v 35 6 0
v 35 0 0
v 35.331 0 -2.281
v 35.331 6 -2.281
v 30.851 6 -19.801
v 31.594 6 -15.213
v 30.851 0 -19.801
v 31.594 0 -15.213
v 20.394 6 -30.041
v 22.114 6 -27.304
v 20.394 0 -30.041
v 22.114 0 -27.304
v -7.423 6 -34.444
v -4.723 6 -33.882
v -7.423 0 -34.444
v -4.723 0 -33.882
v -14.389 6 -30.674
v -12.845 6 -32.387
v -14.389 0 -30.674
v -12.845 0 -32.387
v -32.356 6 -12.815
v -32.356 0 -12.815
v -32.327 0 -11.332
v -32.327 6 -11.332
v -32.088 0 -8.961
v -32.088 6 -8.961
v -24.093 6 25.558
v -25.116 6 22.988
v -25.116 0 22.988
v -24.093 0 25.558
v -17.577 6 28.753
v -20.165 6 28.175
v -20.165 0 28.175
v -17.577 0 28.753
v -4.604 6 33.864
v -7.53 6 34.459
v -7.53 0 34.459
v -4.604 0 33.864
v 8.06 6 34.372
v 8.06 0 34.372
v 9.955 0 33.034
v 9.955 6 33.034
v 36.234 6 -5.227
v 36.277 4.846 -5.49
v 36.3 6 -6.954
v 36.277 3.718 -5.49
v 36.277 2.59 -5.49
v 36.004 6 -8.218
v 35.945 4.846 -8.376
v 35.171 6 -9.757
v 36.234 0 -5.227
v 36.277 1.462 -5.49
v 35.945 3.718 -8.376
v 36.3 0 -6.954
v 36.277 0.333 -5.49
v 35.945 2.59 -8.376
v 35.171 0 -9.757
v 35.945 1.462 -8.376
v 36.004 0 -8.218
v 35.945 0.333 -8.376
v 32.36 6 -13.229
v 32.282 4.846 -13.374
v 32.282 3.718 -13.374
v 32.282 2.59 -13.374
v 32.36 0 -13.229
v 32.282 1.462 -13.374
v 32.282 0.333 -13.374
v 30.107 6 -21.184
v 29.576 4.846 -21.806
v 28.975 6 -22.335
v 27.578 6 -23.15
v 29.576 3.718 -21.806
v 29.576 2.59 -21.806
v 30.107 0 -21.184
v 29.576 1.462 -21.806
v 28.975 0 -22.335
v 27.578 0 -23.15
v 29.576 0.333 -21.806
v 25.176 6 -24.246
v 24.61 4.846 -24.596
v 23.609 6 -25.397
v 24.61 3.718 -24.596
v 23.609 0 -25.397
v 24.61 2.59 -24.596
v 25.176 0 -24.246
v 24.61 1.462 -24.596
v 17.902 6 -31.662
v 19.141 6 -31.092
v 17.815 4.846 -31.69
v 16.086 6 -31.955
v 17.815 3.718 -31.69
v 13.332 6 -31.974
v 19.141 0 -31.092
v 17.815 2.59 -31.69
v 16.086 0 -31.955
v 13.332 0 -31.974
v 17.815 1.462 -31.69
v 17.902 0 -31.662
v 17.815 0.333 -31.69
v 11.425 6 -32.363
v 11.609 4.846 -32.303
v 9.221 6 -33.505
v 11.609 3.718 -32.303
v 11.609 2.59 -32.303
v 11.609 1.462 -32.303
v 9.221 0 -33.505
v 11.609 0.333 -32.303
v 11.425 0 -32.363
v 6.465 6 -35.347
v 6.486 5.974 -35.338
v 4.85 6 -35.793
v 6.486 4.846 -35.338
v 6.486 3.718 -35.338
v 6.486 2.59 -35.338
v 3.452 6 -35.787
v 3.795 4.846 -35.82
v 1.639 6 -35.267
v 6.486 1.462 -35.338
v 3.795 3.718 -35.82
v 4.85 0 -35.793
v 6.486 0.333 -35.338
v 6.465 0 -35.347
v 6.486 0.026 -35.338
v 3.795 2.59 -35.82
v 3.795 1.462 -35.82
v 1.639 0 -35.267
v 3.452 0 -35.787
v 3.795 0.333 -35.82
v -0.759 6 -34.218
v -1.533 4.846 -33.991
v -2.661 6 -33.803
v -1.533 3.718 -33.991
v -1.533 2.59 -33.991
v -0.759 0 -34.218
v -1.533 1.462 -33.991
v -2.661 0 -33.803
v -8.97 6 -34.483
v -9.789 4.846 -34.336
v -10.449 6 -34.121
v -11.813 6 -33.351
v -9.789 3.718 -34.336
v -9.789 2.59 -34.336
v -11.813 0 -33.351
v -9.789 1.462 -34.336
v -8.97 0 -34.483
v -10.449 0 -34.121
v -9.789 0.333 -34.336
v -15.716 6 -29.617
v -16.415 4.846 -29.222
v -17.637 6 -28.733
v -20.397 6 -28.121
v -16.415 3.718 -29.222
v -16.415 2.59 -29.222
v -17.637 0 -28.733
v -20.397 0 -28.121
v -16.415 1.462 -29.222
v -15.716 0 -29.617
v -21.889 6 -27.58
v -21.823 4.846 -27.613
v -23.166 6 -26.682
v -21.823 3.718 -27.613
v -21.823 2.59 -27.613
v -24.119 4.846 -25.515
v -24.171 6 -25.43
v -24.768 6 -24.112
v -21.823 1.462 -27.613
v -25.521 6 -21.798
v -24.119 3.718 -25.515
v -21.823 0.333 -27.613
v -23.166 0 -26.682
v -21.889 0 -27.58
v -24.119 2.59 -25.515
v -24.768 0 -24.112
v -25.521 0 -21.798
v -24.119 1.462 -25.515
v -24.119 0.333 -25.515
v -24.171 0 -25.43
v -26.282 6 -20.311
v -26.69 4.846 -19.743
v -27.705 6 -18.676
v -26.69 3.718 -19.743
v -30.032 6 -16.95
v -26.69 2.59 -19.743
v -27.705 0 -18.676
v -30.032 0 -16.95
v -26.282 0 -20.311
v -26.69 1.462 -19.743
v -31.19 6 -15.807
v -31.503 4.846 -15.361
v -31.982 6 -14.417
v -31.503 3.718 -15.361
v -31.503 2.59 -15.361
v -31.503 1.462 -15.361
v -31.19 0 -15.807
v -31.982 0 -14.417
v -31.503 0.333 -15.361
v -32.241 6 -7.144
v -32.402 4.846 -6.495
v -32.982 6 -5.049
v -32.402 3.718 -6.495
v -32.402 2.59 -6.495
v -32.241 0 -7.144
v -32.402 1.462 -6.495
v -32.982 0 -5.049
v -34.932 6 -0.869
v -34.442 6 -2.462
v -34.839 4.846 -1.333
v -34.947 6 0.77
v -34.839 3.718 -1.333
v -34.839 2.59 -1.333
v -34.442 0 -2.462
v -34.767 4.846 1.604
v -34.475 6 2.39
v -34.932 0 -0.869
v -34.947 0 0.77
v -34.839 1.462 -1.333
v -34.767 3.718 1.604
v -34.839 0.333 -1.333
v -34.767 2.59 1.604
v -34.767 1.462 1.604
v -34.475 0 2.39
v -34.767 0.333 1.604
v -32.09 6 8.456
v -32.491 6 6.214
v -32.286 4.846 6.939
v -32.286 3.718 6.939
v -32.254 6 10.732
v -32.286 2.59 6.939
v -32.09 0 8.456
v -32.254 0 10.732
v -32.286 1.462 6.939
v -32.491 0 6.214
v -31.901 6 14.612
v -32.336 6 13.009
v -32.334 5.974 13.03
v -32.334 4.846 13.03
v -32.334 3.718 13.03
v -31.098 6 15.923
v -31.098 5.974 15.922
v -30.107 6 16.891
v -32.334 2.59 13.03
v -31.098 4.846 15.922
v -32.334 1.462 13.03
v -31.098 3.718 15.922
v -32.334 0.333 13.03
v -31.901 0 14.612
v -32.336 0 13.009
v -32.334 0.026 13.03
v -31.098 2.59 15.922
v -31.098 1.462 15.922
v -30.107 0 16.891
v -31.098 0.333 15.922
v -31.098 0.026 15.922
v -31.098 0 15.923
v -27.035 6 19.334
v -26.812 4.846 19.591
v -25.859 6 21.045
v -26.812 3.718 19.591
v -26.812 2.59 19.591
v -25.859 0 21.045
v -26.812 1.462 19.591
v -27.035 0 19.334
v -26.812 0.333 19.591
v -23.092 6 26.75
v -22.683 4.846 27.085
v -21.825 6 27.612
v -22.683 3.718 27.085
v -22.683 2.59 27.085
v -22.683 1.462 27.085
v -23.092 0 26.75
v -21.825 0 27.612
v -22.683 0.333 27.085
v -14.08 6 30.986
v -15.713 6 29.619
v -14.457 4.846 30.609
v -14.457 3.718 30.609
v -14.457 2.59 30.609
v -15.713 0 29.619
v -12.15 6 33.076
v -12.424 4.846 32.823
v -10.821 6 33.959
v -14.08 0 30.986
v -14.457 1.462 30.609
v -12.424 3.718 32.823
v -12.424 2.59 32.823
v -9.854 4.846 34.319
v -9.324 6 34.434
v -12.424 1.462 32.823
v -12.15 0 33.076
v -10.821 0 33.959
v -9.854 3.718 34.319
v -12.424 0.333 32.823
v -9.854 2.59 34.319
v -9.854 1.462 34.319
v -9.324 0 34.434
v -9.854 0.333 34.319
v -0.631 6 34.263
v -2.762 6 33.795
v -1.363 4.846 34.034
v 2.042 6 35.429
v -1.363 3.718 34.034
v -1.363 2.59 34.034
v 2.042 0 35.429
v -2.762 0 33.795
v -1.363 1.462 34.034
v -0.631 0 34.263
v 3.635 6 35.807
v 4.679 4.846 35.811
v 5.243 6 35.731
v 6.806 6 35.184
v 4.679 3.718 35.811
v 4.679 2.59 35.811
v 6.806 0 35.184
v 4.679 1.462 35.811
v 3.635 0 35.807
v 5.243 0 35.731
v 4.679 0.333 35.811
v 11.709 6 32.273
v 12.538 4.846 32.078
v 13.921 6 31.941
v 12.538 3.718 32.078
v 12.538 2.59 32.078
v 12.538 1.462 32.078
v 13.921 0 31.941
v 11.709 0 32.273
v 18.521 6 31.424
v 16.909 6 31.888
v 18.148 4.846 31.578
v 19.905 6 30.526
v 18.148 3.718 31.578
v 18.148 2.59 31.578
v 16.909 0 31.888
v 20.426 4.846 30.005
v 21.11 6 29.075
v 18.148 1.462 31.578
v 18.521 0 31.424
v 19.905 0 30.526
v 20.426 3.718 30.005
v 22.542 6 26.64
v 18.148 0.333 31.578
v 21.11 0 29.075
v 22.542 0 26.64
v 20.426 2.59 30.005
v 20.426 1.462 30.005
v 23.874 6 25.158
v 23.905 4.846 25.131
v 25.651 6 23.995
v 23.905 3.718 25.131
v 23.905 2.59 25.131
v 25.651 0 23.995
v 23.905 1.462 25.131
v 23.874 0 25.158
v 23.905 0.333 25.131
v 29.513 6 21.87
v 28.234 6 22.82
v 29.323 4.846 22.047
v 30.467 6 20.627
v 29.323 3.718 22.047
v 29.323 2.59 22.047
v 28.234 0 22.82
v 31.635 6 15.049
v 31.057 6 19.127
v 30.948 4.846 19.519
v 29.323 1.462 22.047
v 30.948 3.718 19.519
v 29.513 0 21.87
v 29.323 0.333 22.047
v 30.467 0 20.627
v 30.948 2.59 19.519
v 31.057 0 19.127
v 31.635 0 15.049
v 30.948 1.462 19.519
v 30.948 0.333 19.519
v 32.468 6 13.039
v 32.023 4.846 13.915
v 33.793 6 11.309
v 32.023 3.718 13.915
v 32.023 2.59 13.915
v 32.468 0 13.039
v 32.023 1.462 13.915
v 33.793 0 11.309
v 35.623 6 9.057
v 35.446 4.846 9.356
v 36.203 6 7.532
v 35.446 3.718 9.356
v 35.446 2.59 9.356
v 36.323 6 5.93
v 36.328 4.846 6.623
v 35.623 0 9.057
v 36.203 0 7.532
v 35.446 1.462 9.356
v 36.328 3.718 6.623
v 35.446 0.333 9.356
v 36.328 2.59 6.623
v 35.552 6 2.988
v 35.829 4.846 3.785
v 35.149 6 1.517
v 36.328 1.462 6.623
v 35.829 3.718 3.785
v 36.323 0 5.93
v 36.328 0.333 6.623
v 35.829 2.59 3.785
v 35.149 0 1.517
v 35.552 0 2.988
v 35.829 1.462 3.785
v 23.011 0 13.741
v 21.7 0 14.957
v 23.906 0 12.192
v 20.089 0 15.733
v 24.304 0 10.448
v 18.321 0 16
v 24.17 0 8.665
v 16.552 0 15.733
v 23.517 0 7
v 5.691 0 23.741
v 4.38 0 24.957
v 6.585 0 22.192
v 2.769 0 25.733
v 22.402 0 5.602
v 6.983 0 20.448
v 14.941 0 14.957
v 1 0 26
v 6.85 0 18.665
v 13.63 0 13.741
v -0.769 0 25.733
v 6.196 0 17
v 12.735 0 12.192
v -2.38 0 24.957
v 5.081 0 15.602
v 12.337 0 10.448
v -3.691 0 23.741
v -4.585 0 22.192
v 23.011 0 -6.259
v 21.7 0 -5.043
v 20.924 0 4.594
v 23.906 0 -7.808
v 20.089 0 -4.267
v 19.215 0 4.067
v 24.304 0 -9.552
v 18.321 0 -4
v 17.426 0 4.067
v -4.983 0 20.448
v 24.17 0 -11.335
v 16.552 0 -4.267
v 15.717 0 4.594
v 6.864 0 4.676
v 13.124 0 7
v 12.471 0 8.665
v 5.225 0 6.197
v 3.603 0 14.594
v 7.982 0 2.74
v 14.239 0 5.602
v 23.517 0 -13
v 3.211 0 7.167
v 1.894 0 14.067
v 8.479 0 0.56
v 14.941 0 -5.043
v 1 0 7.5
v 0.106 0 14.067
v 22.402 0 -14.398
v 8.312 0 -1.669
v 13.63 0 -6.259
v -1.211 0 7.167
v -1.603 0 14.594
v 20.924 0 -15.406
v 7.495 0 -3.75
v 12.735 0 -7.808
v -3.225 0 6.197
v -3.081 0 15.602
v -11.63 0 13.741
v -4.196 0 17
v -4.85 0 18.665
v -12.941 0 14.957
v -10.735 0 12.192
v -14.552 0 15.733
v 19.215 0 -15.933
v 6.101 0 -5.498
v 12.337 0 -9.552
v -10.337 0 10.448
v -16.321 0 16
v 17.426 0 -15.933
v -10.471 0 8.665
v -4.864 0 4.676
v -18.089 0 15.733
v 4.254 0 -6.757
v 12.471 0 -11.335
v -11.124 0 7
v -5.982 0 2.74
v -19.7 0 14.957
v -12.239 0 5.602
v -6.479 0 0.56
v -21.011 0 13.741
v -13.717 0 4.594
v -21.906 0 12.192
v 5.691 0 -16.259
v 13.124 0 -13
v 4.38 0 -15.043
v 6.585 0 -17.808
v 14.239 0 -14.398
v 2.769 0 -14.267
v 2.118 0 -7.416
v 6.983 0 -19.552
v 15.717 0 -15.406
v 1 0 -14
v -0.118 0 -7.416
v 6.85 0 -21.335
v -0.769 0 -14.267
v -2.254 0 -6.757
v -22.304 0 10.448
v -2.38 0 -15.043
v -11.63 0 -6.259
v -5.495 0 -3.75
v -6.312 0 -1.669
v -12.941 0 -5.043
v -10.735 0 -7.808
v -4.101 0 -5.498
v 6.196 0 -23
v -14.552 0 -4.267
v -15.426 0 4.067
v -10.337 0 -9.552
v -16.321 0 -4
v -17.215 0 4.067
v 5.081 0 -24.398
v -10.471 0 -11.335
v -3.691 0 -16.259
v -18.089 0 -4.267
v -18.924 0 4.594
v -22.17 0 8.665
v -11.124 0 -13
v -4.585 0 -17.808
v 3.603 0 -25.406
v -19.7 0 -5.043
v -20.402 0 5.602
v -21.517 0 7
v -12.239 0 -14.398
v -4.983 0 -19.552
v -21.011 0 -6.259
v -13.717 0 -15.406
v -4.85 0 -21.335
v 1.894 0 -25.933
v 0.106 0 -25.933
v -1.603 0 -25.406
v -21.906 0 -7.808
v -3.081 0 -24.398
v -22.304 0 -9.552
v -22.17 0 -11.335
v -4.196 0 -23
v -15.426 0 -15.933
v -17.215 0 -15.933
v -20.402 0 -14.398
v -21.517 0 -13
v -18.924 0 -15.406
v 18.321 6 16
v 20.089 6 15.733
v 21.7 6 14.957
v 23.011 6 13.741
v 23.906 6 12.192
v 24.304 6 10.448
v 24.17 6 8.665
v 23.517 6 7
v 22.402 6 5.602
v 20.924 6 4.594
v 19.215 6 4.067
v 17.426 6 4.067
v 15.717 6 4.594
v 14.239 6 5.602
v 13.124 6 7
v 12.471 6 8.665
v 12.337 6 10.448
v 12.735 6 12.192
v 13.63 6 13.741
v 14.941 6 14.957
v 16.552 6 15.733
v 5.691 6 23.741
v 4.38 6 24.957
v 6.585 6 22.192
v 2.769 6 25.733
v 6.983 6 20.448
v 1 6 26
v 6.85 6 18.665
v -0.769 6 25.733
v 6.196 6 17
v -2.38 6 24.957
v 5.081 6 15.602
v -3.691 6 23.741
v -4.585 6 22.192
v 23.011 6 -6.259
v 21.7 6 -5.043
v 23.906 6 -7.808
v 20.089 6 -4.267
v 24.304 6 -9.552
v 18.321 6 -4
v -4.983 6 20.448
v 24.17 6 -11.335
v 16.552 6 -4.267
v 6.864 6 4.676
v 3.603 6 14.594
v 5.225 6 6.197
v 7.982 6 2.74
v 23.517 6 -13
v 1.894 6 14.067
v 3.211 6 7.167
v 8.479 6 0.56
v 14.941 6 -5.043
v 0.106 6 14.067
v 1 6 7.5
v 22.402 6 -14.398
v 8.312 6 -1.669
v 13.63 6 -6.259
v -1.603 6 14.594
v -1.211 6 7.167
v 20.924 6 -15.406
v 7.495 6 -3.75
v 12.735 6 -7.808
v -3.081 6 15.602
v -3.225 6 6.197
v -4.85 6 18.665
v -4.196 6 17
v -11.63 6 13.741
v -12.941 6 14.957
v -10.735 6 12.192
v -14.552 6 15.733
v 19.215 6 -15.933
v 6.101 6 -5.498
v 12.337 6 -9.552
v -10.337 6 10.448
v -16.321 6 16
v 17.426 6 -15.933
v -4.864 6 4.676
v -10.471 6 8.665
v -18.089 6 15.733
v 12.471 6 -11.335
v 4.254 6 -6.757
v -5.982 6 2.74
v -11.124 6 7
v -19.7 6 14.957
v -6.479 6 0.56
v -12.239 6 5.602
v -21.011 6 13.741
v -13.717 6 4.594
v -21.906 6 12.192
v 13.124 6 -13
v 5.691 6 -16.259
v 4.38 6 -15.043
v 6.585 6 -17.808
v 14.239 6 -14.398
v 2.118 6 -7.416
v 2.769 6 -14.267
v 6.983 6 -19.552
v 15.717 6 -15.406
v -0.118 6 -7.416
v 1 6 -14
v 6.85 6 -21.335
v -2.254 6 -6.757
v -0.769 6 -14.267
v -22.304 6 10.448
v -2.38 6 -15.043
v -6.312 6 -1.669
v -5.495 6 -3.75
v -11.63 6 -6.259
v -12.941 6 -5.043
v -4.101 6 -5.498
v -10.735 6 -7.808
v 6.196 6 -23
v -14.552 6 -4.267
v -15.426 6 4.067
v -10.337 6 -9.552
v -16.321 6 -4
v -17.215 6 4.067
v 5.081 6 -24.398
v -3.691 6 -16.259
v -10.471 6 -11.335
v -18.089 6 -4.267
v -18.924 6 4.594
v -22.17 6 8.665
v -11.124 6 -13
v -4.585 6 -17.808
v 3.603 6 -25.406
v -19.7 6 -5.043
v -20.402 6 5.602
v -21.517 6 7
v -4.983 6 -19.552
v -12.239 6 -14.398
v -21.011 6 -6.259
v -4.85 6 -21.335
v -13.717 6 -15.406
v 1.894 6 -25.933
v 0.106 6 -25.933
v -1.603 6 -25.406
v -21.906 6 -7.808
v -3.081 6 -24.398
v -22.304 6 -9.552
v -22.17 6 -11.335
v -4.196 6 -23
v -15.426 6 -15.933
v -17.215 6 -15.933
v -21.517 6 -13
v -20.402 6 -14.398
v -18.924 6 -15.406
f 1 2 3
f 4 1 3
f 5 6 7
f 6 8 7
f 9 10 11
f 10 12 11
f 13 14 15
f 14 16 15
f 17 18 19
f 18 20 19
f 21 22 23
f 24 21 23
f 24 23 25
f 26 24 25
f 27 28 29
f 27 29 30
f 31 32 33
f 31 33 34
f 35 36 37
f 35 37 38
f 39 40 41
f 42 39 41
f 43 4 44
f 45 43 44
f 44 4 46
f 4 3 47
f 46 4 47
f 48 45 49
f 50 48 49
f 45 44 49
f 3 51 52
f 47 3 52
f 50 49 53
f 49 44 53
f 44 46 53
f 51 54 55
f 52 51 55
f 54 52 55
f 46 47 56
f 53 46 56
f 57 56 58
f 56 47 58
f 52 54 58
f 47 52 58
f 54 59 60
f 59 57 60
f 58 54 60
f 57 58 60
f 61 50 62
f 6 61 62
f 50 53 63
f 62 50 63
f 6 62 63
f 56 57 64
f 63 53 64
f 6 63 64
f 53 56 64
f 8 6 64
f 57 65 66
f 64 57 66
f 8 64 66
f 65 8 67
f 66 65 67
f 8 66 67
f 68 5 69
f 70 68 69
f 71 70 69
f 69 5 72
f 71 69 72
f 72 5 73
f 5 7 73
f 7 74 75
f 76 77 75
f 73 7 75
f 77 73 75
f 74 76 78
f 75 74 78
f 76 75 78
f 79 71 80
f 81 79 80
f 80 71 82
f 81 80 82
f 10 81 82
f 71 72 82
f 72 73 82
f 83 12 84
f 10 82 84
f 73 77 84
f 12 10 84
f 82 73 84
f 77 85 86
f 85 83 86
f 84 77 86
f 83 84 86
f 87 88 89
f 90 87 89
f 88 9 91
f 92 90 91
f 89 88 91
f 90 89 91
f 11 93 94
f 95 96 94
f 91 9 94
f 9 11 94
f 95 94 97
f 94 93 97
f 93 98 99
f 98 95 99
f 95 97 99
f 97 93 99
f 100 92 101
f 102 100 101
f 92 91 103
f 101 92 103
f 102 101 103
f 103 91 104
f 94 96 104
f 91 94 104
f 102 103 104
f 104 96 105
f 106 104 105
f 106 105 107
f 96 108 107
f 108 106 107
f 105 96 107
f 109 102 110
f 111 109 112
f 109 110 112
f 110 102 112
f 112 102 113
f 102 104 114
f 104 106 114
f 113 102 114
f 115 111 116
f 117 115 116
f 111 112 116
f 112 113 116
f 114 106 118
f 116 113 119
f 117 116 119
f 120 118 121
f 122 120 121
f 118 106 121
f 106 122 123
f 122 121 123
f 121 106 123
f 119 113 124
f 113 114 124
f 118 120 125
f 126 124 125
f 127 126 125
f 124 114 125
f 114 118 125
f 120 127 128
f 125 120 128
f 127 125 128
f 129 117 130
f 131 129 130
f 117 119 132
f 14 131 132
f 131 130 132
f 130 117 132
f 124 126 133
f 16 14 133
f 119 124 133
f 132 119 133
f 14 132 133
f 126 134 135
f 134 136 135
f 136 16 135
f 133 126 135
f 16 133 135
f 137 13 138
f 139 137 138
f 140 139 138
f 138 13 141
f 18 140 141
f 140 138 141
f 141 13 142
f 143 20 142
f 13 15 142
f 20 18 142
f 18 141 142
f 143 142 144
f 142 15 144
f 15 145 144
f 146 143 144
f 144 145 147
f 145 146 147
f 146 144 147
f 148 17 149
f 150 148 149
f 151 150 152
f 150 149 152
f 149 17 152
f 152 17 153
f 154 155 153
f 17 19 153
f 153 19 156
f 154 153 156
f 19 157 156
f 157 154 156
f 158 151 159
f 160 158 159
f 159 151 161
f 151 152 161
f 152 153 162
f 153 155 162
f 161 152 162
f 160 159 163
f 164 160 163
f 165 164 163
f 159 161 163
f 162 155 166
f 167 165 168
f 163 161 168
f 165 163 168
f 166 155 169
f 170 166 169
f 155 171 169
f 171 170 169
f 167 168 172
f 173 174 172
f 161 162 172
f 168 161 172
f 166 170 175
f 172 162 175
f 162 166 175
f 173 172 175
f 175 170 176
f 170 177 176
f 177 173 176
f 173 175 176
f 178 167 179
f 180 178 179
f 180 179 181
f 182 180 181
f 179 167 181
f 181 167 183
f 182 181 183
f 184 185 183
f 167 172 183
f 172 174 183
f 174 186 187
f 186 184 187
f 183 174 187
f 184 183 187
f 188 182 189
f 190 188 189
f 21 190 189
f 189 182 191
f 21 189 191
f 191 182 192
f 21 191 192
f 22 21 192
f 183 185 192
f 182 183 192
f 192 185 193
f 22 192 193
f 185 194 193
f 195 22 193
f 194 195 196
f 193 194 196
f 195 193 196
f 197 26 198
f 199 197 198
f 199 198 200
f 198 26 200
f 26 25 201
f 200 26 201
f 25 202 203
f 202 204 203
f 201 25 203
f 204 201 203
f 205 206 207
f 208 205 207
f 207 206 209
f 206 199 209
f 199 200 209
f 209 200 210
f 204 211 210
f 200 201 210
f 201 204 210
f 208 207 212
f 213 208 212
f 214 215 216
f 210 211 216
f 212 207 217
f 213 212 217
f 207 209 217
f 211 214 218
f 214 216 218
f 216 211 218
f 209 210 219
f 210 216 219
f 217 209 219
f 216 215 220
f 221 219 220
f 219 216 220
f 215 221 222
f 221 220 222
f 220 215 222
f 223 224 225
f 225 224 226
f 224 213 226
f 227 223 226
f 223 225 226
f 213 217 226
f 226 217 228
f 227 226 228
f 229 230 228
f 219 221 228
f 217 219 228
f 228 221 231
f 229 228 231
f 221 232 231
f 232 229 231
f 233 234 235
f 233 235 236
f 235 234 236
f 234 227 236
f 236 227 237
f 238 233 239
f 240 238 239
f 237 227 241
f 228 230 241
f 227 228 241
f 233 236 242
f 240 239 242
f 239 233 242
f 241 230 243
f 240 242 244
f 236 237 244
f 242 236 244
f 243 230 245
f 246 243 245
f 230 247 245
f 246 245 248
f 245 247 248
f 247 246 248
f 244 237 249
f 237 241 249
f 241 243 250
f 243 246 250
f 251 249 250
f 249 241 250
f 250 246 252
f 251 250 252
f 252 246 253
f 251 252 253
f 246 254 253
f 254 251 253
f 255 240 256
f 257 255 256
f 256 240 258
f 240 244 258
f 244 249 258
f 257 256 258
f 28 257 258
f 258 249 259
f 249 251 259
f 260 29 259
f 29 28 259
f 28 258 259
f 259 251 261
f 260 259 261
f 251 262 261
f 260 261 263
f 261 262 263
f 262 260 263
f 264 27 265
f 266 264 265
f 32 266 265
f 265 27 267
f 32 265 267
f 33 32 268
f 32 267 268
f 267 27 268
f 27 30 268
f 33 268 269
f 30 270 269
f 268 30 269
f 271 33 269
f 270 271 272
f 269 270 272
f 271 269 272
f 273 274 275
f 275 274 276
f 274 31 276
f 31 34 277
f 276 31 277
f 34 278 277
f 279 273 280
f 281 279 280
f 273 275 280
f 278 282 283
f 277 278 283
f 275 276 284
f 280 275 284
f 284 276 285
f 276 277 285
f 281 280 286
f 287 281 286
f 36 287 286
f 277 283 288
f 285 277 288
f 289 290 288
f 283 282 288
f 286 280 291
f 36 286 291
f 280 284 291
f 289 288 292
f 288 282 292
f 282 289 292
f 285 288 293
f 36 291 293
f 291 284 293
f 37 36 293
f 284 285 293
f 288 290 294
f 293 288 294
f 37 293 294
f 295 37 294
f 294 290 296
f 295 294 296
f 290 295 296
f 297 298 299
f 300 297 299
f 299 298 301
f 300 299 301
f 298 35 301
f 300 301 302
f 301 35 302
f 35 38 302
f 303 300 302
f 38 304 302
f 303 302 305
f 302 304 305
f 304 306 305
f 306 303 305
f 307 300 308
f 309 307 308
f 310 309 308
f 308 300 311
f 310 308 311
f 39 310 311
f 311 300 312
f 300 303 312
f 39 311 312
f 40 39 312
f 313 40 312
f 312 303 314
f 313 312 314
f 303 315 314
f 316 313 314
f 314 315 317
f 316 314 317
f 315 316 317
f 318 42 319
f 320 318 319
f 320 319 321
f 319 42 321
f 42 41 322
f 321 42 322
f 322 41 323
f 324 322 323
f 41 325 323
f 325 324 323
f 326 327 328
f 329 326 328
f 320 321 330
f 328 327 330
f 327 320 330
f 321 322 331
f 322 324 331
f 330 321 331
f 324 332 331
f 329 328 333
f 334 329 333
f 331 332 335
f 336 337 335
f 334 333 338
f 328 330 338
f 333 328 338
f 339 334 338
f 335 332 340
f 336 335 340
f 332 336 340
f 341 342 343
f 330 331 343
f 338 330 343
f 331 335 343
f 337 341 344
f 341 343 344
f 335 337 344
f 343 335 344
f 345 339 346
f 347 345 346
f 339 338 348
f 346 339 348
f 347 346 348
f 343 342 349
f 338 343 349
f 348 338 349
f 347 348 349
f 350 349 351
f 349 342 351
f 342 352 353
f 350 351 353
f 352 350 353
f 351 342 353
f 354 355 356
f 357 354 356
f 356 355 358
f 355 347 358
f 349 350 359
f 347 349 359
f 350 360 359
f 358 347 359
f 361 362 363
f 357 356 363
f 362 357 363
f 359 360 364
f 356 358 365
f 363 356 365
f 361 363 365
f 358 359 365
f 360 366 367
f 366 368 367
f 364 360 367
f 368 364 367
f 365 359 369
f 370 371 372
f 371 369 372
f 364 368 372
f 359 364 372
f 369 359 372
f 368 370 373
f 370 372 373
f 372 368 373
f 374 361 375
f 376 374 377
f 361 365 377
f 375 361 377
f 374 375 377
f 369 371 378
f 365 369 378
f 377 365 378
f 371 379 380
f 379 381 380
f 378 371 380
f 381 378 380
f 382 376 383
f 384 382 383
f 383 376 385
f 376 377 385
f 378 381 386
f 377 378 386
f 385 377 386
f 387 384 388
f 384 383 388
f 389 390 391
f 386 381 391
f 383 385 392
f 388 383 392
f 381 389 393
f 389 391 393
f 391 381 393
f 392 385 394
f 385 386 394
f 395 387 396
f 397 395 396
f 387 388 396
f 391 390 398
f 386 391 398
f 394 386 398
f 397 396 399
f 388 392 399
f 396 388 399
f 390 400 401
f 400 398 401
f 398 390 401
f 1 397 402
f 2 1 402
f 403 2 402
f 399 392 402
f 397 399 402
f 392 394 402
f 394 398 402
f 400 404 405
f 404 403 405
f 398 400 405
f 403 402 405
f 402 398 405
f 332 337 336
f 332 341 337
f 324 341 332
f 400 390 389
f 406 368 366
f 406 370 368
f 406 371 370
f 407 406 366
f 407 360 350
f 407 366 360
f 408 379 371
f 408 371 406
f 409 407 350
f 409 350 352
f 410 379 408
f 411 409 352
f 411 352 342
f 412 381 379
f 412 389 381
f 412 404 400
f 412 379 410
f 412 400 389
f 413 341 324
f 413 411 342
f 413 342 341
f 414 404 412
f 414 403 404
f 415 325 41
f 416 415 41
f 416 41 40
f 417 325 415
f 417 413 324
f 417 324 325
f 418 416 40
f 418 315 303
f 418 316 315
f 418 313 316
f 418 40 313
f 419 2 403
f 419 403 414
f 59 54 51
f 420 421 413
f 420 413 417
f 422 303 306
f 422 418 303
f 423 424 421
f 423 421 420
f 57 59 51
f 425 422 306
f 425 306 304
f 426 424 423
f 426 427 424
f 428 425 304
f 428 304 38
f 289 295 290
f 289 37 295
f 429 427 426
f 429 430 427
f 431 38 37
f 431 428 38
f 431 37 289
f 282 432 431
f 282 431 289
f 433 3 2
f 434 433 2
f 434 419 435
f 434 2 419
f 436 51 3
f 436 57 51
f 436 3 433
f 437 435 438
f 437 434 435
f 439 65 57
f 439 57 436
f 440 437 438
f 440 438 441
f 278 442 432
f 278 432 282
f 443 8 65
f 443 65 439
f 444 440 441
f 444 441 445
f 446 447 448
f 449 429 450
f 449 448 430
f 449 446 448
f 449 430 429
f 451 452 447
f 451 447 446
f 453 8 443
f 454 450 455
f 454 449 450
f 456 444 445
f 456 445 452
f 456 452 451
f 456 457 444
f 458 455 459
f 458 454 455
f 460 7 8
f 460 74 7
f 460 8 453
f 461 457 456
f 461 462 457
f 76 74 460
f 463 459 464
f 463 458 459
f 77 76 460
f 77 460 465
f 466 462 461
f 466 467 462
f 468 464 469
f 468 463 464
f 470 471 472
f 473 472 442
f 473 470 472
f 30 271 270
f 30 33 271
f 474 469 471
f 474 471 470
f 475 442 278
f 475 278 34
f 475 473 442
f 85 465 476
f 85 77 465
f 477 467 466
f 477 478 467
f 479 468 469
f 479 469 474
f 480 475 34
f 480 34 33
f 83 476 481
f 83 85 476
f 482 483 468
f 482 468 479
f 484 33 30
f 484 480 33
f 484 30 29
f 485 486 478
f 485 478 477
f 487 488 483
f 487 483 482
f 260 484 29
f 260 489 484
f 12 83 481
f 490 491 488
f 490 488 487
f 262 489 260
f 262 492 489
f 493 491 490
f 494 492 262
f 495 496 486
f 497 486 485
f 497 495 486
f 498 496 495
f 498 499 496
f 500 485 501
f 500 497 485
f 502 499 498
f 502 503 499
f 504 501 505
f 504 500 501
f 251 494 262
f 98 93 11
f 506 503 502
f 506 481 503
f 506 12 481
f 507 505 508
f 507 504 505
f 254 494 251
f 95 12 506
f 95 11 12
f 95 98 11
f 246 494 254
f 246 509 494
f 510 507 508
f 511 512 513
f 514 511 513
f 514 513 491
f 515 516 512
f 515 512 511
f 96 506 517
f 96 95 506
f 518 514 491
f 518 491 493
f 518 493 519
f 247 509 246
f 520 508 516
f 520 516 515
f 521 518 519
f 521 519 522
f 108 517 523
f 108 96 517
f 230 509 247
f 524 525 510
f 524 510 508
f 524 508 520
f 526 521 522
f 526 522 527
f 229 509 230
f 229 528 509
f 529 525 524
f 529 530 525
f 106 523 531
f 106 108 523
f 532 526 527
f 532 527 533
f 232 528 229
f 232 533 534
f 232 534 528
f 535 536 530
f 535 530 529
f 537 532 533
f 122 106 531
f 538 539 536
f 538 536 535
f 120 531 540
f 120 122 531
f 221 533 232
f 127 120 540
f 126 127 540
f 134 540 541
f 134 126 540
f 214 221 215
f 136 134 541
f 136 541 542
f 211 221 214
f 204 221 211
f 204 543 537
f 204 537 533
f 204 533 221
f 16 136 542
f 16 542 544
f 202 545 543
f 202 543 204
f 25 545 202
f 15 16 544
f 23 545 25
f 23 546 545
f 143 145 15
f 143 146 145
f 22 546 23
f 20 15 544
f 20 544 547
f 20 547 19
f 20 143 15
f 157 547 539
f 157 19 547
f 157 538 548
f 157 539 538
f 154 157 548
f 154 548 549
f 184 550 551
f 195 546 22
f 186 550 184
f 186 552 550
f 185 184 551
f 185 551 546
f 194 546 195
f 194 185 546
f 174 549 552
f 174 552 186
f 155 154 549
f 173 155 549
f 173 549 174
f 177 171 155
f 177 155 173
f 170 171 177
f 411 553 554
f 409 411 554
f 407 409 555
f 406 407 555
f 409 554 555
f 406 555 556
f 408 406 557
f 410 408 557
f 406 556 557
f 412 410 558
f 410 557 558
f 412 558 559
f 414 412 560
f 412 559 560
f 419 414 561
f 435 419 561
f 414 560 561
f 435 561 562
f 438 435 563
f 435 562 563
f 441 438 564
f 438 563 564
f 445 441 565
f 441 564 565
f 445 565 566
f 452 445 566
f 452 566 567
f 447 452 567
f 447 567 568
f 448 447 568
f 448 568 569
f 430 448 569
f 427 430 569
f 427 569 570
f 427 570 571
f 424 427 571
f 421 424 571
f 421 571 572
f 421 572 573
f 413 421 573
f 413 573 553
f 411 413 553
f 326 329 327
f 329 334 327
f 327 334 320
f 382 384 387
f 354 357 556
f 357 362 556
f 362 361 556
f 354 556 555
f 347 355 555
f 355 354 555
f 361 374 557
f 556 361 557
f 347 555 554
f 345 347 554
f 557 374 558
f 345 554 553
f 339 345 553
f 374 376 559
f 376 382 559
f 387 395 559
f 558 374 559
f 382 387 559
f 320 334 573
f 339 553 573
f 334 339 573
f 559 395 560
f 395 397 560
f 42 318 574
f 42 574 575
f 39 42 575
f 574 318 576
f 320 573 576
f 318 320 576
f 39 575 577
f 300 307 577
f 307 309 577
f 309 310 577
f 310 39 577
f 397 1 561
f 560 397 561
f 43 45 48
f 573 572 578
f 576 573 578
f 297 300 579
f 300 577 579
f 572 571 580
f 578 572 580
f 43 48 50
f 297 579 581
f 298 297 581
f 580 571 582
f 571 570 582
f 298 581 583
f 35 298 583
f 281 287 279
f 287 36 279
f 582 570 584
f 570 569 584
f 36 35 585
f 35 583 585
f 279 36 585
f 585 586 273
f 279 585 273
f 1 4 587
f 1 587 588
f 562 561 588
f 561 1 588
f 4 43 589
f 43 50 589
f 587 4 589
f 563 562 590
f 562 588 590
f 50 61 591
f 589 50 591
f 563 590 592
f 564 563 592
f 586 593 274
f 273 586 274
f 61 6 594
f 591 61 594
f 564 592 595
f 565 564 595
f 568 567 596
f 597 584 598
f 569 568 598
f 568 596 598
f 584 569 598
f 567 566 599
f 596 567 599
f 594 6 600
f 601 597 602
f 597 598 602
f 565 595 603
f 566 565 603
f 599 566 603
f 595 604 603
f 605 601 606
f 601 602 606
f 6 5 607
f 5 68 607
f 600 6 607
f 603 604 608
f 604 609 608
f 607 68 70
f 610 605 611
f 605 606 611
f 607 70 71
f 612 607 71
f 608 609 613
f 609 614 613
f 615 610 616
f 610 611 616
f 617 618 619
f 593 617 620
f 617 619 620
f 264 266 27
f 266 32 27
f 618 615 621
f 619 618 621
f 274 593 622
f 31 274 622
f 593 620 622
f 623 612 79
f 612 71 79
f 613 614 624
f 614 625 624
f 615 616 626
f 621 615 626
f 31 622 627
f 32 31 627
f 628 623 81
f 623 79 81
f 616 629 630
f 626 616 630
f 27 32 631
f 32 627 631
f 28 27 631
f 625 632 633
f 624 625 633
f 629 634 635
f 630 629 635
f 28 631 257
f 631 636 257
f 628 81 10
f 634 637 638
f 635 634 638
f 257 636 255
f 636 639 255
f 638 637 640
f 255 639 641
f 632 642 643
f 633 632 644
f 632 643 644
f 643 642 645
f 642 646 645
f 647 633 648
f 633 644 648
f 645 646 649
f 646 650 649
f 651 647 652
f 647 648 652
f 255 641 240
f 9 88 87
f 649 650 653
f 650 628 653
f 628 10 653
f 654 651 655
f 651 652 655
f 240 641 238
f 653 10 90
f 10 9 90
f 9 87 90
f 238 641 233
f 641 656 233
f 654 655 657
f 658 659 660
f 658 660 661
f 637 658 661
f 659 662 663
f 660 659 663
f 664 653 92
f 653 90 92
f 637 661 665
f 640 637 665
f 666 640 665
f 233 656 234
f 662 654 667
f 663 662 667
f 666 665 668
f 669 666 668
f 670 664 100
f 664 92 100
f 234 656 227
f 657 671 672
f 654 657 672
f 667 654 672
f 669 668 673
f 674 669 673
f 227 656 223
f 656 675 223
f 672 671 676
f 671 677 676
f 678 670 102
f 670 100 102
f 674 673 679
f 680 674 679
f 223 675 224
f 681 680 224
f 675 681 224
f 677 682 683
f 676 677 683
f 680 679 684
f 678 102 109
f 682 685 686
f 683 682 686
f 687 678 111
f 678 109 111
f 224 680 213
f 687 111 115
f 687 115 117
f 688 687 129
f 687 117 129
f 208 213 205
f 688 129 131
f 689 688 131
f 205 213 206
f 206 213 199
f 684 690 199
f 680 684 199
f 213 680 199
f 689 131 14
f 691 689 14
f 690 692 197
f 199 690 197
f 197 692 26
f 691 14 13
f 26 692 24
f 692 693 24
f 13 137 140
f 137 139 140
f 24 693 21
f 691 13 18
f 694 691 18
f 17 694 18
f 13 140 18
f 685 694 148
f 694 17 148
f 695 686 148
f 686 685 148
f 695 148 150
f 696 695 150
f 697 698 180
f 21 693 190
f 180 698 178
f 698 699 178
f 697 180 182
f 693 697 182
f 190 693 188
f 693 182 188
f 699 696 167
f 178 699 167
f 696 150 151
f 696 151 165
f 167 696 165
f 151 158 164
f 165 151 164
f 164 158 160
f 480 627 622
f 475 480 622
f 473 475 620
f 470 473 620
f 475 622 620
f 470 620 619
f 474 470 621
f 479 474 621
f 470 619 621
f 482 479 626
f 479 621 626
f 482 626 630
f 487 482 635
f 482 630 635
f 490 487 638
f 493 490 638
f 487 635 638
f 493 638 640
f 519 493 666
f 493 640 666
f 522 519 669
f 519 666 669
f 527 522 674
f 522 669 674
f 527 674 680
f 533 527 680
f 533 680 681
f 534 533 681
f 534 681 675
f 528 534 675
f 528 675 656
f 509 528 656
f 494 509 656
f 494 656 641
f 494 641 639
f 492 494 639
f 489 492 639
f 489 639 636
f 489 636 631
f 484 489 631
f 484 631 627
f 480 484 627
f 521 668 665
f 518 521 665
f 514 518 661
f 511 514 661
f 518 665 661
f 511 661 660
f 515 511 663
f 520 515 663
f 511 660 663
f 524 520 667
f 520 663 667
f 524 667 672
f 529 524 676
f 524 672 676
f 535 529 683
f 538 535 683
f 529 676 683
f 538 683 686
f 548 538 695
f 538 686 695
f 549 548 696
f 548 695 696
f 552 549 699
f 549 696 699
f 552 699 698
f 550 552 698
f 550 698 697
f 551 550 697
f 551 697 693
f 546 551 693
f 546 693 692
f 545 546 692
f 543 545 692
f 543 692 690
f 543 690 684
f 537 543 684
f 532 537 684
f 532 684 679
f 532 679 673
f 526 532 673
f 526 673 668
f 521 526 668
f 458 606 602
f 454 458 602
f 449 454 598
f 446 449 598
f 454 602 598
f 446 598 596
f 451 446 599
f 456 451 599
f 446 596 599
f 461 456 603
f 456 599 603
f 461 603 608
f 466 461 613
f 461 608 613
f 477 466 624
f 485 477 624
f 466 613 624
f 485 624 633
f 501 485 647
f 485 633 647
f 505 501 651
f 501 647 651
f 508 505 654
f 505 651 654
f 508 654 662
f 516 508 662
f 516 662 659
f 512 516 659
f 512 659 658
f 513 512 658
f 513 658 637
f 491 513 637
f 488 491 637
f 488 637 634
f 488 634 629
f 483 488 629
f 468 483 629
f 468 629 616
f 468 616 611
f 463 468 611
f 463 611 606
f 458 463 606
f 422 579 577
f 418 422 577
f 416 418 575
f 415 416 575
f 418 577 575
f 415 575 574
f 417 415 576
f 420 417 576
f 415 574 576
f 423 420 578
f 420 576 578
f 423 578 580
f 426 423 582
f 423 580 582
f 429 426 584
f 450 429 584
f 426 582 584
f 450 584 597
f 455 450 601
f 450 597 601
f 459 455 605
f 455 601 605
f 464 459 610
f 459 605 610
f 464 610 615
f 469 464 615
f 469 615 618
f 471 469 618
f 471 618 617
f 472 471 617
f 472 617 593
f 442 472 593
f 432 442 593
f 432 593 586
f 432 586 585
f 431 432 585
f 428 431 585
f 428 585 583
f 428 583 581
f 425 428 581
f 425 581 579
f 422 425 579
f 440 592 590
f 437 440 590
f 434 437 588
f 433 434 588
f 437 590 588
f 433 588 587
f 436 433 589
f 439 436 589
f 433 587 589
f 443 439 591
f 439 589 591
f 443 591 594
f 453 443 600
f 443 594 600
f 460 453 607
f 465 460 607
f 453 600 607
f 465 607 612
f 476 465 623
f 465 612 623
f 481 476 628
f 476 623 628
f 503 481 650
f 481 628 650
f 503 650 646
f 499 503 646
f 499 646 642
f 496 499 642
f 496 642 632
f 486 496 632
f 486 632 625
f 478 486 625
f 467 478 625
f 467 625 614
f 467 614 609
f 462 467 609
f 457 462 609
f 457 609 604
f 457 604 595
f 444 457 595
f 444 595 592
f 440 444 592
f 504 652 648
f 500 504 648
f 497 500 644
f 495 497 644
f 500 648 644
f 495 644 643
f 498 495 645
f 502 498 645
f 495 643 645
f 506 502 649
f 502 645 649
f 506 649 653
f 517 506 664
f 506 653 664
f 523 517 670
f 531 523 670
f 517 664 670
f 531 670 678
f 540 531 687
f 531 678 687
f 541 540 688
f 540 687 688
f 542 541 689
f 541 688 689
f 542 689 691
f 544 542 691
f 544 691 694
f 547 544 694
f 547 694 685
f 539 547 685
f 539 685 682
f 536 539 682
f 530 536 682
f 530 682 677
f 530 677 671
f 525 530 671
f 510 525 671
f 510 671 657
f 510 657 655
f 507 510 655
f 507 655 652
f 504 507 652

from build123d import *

# Parameters (mm, degrees)
BOSS_EXTRUDE1_DEPTH = 6
SKETCH4_R           = 7.5
SKETCH4_R_2         = 6
CUT_EXTRUDE1_DEPTH  = 52.384193919


with BuildPart() as part:
    # Sketch3 → Boss-Extrude1 (new body)
    with BuildSketch(Plane(origin=(0, 0, 0), x_dir=(1, 0, 0), z_dir=(0, 1, 0))):
        with BuildLine():
            add(Edge.make_bspline(
                [(35, 0), (35, -0.035819521), (35.000616373, -0.107462841), (35.003390054, -0.256808001), (35.01077535, -0.421646412), (35.021825769, -0.588219856), (35.036504882, -0.756672424), (35.059341773, -0.965837166), (35.104035951, -1.290553755), (35.185204177, -1.728353621), (35.321111932, -2.274340702), (35.511398877, -2.882930915), (35.744117036, -3.541888991), (35.999231194, -4.258009419), (36.256031973, -5.161379021), (36.390330129, -6.274752326), (36.277015947, -7.512136968), (35.868698722, -8.695231312), (35.277300884, -9.66942621), (34.554347706, -10.519941998), (33.783626013, -11.298902854), (32.985846748, -12.201646946), (32.264584631, -13.302976589), (31.737724515, -14.528623762), (31.426244596, -15.845428611), (31.299137645, -17.272582429), (31.216127, -18.70530298), (30.816120234, -20.100603953), (30.073240875, -21.341751417), (29.174351138, -22.250438514), (28.172415899, -22.896093054), (27.127590319, -23.355931745), (26.10859664, -23.758738205), (25.049780962, -24.277964858), (23.989709649, -24.997868071), (23.038745697, -25.922173331), (22.234852767, -27.032885429), (21.570018171, -28.281907031), (20.900127092, -29.513378935), (19.962466181, -30.574068753), (18.79518192, -31.366318649), (17.595631263, -31.810691731), (16.414666993, -31.97433085), (15.281171148, -31.958959306), (14.203514384, -31.91747762), (13.042151806, -31.968001953), (11.783279681, -32.201214224), (10.531309832, -32.66971044), (9.48395263, -33.292502605), (8.64833417, -33.920550222), (7.823957174, -34.560196787), (6.963270269, -35.155080008), (5.844676613, -35.655024643), (4.471519425, -35.893755086), (3.187084678, -35.805499476), (2.025952577, -35.461710054), (0.992256939, -34.976213141), (0.022683462, -34.502923006), (-1.053080375, -34.087641485), (-2.299584809, -33.794526859), (-3.643320491, -33.722351618), (-5.038534255, -33.89893647), (-6.24598376, -34.2125404), (-7.264354515, -34.444119371), (-8.305207807, -34.543324073), (-9.35208771, -34.482213909), (-10.516758731, -34.167289325), (-11.659268337, -33.537177777), (-12.590715473, -32.709121516), (-13.34098787, -31.814858509), (-14.054283468, -30.982389039), (-14.885038409, -30.182951686), (-15.921872801, -29.43179423), (-16.990420846, -28.917750141), (-18.026343297, -28.602305782), (-18.91800709, -28.413618025), (-19.578784746, -28.293993848), (-20.403759493, -28.135463838), (-21.377672688, -27.861653344), (-22.443971731, -27.335099918), (-23.483734656, -26.460176512), (-24.2541157, -25.405895772), (-24.750574375, -24.262578026), (-25.063904971, -23.146552345), (-25.378639074, -22.114017621), (-25.813131886, -21.064921211), (-26.460434486, -19.960662125), (-27.343829971, -18.932625358), (-28.322904319, -18.143559056), (-29.218225657, -17.541804862), (-30.028748291, -16.972737819), (-30.797058719, -16.328598531), (-31.549909645, -15.413617977), (-32.137977425, -14.188738612), (-32.4089126, -12.90202686), (-32.388985538, -11.637704019), (-32.213594685, -10.474436855), (-32.085323796, -9.385180269), (-32.070146732, -8.410557002), (-32.151917663, -7.56387468), (-32.314560623, -6.756019588), (-32.548800101, -5.992599911), (-32.857935391, -5.266485518), (-33.224571123, -4.579437291), (-33.588738685, -3.973485748), (-33.923596212, -3.433268023), (-34.247631958, -2.87530324), (-34.535248612, -2.28660009), (-34.721954293, -1.781365153), (-34.833464319, -1.375289499), (-34.894669525, -1.087159539), (-34.924762046, -0.921603411), (-34.949915122, -0.755248907), (-34.967564963, -0.608302523), (-34.979558938, -0.483828007), (-34.987456793, -0.380154151), (-34.992514334, -0.294893351), (-34.997257891, -0.183172559), (-34.999367206, -0.089514524), (-35, -0.035799586), (-35, 0)],
                knots=[0.072369566, 0.072369566, 0.072369566, 0.072369566, 0.072369566, 0.073615092, 0.074860618, 0.076106145, 0.077351671, 0.078597197, 0.079842723, 0.082333775, 0.087048504, 0.091763233, 0.096477961, 0.10119269, 0.107724794, 0.114256899, 0.124215283, 0.134174364, 0.144132897, 0.150929746, 0.157726596, 0.167142542, 0.176558488, 0.186520945, 0.196481925, 0.206428247, 0.21637457, 0.228908069, 0.238866866, 0.248825964, 0.258784129, 0.266347185, 0.273910241, 0.282559119, 0.291207998, 0.301173216, 0.311644672, 0.321600071, 0.33155547, 0.343058906, 0.353017844, 0.362977018, 0.372934936, 0.380512964, 0.388090993, 0.396475019, 0.404859045, 0.41482336, 0.425823506, 0.435780105, 0.440758404, 0.445736704, 0.456709828, 0.4666684, 0.476627191, 0.48658549, 0.494428383, 0.502271277, 0.510390705, 0.518510134, 0.528474739, 0.540002591, 0.549960093, 0.559917595, 0.565389224, 0.570860853, 0.580819423, 0.590778216, 0.600736338, 0.609094586, 0.617452834, 0.625307542, 0.633162249, 0.643125841, 0.655188139, 0.660154677, 0.665121215, 0.670087753, 0.675054292, 0.685012018, 0.694970449, 0.704929277, 0.714887192, 0.723259667, 0.731632143, 0.739222078, 0.746812013, 0.756777196, 0.769365725, 0.779035556, 0.783870472, 0.788705388, 0.798661668, 0.808620831, 0.818580086, 0.828537566, 0.837174689, 0.845811813, 0.853388632, 0.860965452, 0.865947313, 0.870929173, 0.87773944, 0.884549706, 0.889251298, 0.893952891, 0.898654484, 0.903356076, 0.908334949, 0.913313821, 0.914558654, 0.915803487, 0.91704832, 0.918293153, 0.919537985, 0.920160402, 0.920782818, 0.921405235, 0.922027651, 0.923272484, 0.923272484, 0.923272484, 0.923272484, 0.923272484], degree=4))
            add(Edge.make_bspline(
                [(35, 0), (35, 0.035819522), (35.000616373, 0.107462841), (35.003390054, 0.256808001), (35.01077535, 0.421646413), (35.021825769, 0.588219856), (35.036504882, 0.756672424), (35.059341773, 0.965837166), (35.104035951, 1.290553755), (35.185204177, 1.728353622), (35.321111932, 2.274340703), (35.511398877, 2.882930915), (35.744117036, 3.541888991), (35.999231193, 4.25800942), (36.256031973, 5.161379022), (36.390330129, 6.274752326), (36.277015947, 7.512136969), (35.868698722, 8.695231313), (35.277300884, 9.669426211), (34.554347705, 10.519941998), (33.783626013, 11.298902855), (32.985846748, 12.201646947), (32.264584631, 13.30297659), (31.737724515, 14.528623762), (31.426244596, 15.845428611), (31.299137645, 17.27258243), (31.216127, 18.70530298), (30.816120234, 20.100603953), (30.073240875, 21.341751418), (29.174351138, 22.250438515), (28.172415899, 22.896093055), (27.127590318, 23.355931746), (26.10859664, 23.758738206), (25.049780962, 24.277964858), (23.989709649, 24.997868072), (23.038745697, 25.922173331), (22.234852767, 27.03288543), (21.57001817, 28.281907032), (20.900127092, 29.513378936), (19.962466181, 30.574068753), (18.795181919, 31.366318649), (17.595631263, 31.810691732), (16.414666993, 31.974330851), (15.281171148, 31.958959306), (14.203514384, 31.91747762), (13.042151806, 31.968001953), (11.783279681, 32.201214224), (10.531309832, 32.66971044), (9.48395263, 33.292502605), (8.648334169, 33.920550223), (7.823957174, 34.560196788), (6.963270269, 35.155080008), (5.844676613, 35.655024643), (4.471519425, 35.893755086), (3.187084678, 35.805499477), (2.025952576, 35.461710054), (0.992256939, 34.976213141), (0.022683462, 34.502923006), (-1.053080375, 34.087641485), (-2.299584809, 33.794526859), (-3.643320491, 33.722351619), (-5.038534255, 33.89893647), (-6.24598376, 34.2125404), (-7.264354515, 34.444119372), (-8.305207807, 34.543324073), (-9.35208771, 34.482213909), (-10.516758731, 34.167289325), (-11.659268337, 33.537177777), (-12.590715473, 32.709121516), (-13.34098787, 31.814858509), (-14.054283468, 30.982389039), (-14.885038409, 30.182951686), (-15.921872801, 29.431794231), (-16.990420846, 28.917750141), (-18.026343297, 28.602305782), (-18.918007091, 28.413618025), (-19.578784746, 28.293993849), (-20.403759493, 28.135463838), (-21.377672688, 27.861653344), (-22.443971731, 27.335099919), (-23.483734656, 26.460176512), (-24.2541157, 25.405895772), (-24.750574375, 24.262578026), (-25.063904971, 23.146552345), (-25.378639074, 22.114017621), (-25.813131886, 21.064921211), (-26.460434486, 19.960662125), (-27.343829971, 18.932625358), (-28.322904319, 18.143559056), (-29.218225657, 17.541804862), (-30.028748291, 16.97273782), (-30.797058719, 16.328598531), (-31.549909645, 15.413617977), (-32.137977425, 14.188738612), (-32.4089126, 12.90202686), (-32.388985538, 11.637704019), (-32.213594686, 10.474436855), (-32.085323796, 9.385180269), (-32.070146733, 8.410557002), (-32.151917663, 7.56387468), (-32.314560623, 6.756019588), (-32.548800101, 5.992599911), (-32.857935391, 5.266485518), (-33.224571124, 4.579437291), (-33.588738685, 3.973485748), (-33.923596212, 3.433268023), (-34.247631958, 2.87530324), (-34.535248612, 2.28660009), (-34.721954293, 1.781365153), (-34.833464319, 1.375289499), (-34.894669525, 1.087159539), (-34.924762046, 0.921603412), (-34.949915122, 0.755248907), (-34.967564963, 0.608302523), (-34.979558938, 0.483828007), (-34.987456793, 0.380154151), (-34.992514334, 0.294893351), (-34.997257891, 0.183172559), (-34.999367206, 0.089514524), (-35, 0.035799586), (-35, 0)],
                knots=[0.072369566, 0.072369566, 0.072369566, 0.072369566, 0.072369566, 0.073615092, 0.074860618, 0.076106145, 0.077351671, 0.078597197, 0.079842723, 0.082333775, 0.087048504, 0.091763233, 0.096477961, 0.10119269, 0.107724794, 0.114256899, 0.124215283, 0.134174364, 0.144132897, 0.150929746, 0.157726596, 0.167142542, 0.176558488, 0.186520945, 0.196481925, 0.206428247, 0.21637457, 0.228908069, 0.238866866, 0.248825964, 0.258784129, 0.266347185, 0.273910241, 0.282559119, 0.291207998, 0.301173216, 0.311644672, 0.321600071, 0.33155547, 0.343058906, 0.353017844, 0.362977018, 0.372934936, 0.380512964, 0.388090993, 0.396475019, 0.404859045, 0.41482336, 0.425823506, 0.435780105, 0.440758404, 0.445736704, 0.456709828, 0.4666684, 0.476627191, 0.48658549, 0.494428383, 0.502271277, 0.510390705, 0.518510134, 0.528474739, 0.540002591, 0.549960093, 0.559917595, 0.565389224, 0.570860853, 0.580819423, 0.590778216, 0.600736338, 0.609094586, 0.617452834, 0.625307542, 0.633162249, 0.643125841, 0.655188139, 0.660154677, 0.665121215, 0.670087753, 0.675054292, 0.685012018, 0.694970449, 0.704929277, 0.714887192, 0.723259667, 0.731632143, 0.739222078, 0.746812013, 0.756777196, 0.769365725, 0.779035556, 0.783870472, 0.788705388, 0.798661668, 0.808620831, 0.818580086, 0.828537566, 0.837174689, 0.845811813, 0.853388632, 0.860965452, 0.865947313, 0.870929173, 0.87773944, 0.884549706, 0.889251298, 0.893952891, 0.898654484, 0.903356076, 0.908334949, 0.913313821, 0.914558654, 0.915803487, 0.91704832, 0.918293153, 0.919537985, 0.920160402, 0.920782818, 0.921405235, 0.922027651, 0.923272484, 0.923272484, 0.923272484, 0.923272484, 0.923272484], degree=4))
        make_face()
    extrude(amount=BOSS_EXTRUDE1_DEPTH)

    # Sketch4 → Cut-Extrude1 (cut, through all)
    with BuildSketch(Plane(origin=(0, 6, 0), x_dir=(1, 0, 0), z_dir=(0, 1, 0))):
        with Locations(Location((1, 0, 0), (0, 0, 270))):
            Circle(SKETCH4_R)
        with Locations(Location((1, 20, 0), (0, 0, 270))):
            Circle(SKETCH4_R_2)
        with Locations(Location((18.320508076, 10, 0), (0, 0, 270))):
            Circle(SKETCH4_R_2)
        with Locations(Location((18.320508076, -10, 0), (0, 0, 270))):
            Circle(SKETCH4_R_2)
        with Locations(Location((1, -20, 0), (0, 0, 270))):
            Circle(SKETCH4_R_2)
        with Locations(Location((-16.320508076, -10, 0), (0, 0, 270))):
            Circle(SKETCH4_R_2)
        with Locations(Location((-16.320508076, 10, 0), (0, 0, 270))):
            Circle(SKETCH4_R_2)
    extrude(amount=-CUT_EXTRUDE1_DEPTH, mode=Mode.SUBTRACT)


solid = part.part
